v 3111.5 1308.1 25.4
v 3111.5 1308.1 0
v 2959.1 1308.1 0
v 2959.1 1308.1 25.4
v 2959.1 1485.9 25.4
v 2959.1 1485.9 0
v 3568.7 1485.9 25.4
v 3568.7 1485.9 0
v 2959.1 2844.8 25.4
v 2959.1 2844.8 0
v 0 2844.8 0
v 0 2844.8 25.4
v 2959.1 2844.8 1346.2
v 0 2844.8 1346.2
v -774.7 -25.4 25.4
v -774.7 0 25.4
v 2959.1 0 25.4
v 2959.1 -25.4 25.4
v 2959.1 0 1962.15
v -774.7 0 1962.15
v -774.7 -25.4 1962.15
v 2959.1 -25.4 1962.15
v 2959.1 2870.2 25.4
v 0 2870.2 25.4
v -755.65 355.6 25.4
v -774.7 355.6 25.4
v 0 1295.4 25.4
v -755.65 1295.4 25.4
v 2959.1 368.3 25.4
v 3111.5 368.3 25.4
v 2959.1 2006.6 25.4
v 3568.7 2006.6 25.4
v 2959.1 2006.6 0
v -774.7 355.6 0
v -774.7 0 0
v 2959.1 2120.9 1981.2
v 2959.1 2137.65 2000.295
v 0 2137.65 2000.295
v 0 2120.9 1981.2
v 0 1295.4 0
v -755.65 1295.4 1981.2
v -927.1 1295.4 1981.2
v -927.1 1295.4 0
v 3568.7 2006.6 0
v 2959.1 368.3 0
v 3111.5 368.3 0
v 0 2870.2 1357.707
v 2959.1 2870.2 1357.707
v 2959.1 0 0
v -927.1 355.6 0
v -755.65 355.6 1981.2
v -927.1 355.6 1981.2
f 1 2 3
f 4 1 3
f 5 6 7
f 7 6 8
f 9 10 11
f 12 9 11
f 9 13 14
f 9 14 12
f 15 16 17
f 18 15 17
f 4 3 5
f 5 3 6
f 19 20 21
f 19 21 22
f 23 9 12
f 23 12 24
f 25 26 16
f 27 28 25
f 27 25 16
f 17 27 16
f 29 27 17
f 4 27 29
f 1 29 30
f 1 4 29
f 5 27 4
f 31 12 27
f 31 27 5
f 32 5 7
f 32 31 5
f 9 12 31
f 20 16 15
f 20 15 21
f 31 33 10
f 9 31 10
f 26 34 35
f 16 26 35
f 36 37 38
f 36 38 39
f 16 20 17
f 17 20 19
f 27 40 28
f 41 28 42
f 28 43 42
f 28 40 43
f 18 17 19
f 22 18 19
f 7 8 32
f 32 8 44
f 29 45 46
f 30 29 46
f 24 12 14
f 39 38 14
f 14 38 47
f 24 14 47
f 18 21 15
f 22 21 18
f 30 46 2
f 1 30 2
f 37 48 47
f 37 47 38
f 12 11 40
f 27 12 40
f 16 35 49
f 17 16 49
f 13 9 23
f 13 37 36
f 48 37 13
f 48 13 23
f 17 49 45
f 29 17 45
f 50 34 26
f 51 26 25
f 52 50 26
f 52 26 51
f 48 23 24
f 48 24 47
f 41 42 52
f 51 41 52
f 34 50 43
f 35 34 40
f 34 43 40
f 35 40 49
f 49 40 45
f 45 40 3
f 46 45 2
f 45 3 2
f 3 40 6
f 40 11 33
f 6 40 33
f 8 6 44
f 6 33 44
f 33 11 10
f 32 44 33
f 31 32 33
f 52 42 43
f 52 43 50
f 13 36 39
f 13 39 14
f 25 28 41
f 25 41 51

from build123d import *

# Parameters (mm, degrees)
F1_DEPTH = 25.4
F2_W     = 3733.8
F2_H     = 1936.75
F3_DEPTH = 25.4
F4_W     = 939.8
F4_H     = 1955.8
F5_DEPTH = 171.45
F7_DEPTH = 2959.1


with BuildPart() as f1:
    # F0 (on Top) → F1 (new body)
    with BuildSketch(Plane.XY):
        Polygon((2959.1, 2844.8), (0, 2844.8), (0, 1295.4), (-927.1, 1295.4), (-927.1, 355.6), (-774.7, 355.6), (-774.7, 0), (2959.1, 0), (2959.1, 368.3), (3111.5, 368.3), (3111.5, 1308.1), (2959.1, 1308.1), (2959.1, 1485.9), (3568.7, 1485.9), (3568.7, 2006.6), (2959.1, 2006.6), align=None)
    extrude(amount=F1_DEPTH)

    # F4 (on face) → F5 (join)
    with BuildSketch(Plane(origin=(-927.1, 0, 0), x_dir=(0, -1, 0), z_dir=(-1, 0, 0))):
        with Locations((-825.5, 1003.3)):
            Rectangle(F4_W, F4_H)
    extrude(amount=-F5_DEPTH)


with BuildPart() as f3:
    # F2 (on face) → F3 (new body)
    with BuildSketch(Plane.XZ):
        with Locations((1092.2, 993.775)):
            Rectangle(F2_W, F2_H)
    extrude(amount=F3_DEPTH)


with BuildPart() as f7:
    # F6 (on face) → F7 (new body)
    with BuildSketch(Plane.YZ.offset(2959.1)):
        Polygon((2844.8, 1346.2), (2844.8, 25.4), (2870.2, 25.4), (2870.2, 1357.7067170678), (2137.649720585, 2000.2946814669), (2120.9, 1981.2), align=None)
    extrude(amount=-F7_DEPTH)


solid = Compound([f1.part, f3.part, f7.part])
